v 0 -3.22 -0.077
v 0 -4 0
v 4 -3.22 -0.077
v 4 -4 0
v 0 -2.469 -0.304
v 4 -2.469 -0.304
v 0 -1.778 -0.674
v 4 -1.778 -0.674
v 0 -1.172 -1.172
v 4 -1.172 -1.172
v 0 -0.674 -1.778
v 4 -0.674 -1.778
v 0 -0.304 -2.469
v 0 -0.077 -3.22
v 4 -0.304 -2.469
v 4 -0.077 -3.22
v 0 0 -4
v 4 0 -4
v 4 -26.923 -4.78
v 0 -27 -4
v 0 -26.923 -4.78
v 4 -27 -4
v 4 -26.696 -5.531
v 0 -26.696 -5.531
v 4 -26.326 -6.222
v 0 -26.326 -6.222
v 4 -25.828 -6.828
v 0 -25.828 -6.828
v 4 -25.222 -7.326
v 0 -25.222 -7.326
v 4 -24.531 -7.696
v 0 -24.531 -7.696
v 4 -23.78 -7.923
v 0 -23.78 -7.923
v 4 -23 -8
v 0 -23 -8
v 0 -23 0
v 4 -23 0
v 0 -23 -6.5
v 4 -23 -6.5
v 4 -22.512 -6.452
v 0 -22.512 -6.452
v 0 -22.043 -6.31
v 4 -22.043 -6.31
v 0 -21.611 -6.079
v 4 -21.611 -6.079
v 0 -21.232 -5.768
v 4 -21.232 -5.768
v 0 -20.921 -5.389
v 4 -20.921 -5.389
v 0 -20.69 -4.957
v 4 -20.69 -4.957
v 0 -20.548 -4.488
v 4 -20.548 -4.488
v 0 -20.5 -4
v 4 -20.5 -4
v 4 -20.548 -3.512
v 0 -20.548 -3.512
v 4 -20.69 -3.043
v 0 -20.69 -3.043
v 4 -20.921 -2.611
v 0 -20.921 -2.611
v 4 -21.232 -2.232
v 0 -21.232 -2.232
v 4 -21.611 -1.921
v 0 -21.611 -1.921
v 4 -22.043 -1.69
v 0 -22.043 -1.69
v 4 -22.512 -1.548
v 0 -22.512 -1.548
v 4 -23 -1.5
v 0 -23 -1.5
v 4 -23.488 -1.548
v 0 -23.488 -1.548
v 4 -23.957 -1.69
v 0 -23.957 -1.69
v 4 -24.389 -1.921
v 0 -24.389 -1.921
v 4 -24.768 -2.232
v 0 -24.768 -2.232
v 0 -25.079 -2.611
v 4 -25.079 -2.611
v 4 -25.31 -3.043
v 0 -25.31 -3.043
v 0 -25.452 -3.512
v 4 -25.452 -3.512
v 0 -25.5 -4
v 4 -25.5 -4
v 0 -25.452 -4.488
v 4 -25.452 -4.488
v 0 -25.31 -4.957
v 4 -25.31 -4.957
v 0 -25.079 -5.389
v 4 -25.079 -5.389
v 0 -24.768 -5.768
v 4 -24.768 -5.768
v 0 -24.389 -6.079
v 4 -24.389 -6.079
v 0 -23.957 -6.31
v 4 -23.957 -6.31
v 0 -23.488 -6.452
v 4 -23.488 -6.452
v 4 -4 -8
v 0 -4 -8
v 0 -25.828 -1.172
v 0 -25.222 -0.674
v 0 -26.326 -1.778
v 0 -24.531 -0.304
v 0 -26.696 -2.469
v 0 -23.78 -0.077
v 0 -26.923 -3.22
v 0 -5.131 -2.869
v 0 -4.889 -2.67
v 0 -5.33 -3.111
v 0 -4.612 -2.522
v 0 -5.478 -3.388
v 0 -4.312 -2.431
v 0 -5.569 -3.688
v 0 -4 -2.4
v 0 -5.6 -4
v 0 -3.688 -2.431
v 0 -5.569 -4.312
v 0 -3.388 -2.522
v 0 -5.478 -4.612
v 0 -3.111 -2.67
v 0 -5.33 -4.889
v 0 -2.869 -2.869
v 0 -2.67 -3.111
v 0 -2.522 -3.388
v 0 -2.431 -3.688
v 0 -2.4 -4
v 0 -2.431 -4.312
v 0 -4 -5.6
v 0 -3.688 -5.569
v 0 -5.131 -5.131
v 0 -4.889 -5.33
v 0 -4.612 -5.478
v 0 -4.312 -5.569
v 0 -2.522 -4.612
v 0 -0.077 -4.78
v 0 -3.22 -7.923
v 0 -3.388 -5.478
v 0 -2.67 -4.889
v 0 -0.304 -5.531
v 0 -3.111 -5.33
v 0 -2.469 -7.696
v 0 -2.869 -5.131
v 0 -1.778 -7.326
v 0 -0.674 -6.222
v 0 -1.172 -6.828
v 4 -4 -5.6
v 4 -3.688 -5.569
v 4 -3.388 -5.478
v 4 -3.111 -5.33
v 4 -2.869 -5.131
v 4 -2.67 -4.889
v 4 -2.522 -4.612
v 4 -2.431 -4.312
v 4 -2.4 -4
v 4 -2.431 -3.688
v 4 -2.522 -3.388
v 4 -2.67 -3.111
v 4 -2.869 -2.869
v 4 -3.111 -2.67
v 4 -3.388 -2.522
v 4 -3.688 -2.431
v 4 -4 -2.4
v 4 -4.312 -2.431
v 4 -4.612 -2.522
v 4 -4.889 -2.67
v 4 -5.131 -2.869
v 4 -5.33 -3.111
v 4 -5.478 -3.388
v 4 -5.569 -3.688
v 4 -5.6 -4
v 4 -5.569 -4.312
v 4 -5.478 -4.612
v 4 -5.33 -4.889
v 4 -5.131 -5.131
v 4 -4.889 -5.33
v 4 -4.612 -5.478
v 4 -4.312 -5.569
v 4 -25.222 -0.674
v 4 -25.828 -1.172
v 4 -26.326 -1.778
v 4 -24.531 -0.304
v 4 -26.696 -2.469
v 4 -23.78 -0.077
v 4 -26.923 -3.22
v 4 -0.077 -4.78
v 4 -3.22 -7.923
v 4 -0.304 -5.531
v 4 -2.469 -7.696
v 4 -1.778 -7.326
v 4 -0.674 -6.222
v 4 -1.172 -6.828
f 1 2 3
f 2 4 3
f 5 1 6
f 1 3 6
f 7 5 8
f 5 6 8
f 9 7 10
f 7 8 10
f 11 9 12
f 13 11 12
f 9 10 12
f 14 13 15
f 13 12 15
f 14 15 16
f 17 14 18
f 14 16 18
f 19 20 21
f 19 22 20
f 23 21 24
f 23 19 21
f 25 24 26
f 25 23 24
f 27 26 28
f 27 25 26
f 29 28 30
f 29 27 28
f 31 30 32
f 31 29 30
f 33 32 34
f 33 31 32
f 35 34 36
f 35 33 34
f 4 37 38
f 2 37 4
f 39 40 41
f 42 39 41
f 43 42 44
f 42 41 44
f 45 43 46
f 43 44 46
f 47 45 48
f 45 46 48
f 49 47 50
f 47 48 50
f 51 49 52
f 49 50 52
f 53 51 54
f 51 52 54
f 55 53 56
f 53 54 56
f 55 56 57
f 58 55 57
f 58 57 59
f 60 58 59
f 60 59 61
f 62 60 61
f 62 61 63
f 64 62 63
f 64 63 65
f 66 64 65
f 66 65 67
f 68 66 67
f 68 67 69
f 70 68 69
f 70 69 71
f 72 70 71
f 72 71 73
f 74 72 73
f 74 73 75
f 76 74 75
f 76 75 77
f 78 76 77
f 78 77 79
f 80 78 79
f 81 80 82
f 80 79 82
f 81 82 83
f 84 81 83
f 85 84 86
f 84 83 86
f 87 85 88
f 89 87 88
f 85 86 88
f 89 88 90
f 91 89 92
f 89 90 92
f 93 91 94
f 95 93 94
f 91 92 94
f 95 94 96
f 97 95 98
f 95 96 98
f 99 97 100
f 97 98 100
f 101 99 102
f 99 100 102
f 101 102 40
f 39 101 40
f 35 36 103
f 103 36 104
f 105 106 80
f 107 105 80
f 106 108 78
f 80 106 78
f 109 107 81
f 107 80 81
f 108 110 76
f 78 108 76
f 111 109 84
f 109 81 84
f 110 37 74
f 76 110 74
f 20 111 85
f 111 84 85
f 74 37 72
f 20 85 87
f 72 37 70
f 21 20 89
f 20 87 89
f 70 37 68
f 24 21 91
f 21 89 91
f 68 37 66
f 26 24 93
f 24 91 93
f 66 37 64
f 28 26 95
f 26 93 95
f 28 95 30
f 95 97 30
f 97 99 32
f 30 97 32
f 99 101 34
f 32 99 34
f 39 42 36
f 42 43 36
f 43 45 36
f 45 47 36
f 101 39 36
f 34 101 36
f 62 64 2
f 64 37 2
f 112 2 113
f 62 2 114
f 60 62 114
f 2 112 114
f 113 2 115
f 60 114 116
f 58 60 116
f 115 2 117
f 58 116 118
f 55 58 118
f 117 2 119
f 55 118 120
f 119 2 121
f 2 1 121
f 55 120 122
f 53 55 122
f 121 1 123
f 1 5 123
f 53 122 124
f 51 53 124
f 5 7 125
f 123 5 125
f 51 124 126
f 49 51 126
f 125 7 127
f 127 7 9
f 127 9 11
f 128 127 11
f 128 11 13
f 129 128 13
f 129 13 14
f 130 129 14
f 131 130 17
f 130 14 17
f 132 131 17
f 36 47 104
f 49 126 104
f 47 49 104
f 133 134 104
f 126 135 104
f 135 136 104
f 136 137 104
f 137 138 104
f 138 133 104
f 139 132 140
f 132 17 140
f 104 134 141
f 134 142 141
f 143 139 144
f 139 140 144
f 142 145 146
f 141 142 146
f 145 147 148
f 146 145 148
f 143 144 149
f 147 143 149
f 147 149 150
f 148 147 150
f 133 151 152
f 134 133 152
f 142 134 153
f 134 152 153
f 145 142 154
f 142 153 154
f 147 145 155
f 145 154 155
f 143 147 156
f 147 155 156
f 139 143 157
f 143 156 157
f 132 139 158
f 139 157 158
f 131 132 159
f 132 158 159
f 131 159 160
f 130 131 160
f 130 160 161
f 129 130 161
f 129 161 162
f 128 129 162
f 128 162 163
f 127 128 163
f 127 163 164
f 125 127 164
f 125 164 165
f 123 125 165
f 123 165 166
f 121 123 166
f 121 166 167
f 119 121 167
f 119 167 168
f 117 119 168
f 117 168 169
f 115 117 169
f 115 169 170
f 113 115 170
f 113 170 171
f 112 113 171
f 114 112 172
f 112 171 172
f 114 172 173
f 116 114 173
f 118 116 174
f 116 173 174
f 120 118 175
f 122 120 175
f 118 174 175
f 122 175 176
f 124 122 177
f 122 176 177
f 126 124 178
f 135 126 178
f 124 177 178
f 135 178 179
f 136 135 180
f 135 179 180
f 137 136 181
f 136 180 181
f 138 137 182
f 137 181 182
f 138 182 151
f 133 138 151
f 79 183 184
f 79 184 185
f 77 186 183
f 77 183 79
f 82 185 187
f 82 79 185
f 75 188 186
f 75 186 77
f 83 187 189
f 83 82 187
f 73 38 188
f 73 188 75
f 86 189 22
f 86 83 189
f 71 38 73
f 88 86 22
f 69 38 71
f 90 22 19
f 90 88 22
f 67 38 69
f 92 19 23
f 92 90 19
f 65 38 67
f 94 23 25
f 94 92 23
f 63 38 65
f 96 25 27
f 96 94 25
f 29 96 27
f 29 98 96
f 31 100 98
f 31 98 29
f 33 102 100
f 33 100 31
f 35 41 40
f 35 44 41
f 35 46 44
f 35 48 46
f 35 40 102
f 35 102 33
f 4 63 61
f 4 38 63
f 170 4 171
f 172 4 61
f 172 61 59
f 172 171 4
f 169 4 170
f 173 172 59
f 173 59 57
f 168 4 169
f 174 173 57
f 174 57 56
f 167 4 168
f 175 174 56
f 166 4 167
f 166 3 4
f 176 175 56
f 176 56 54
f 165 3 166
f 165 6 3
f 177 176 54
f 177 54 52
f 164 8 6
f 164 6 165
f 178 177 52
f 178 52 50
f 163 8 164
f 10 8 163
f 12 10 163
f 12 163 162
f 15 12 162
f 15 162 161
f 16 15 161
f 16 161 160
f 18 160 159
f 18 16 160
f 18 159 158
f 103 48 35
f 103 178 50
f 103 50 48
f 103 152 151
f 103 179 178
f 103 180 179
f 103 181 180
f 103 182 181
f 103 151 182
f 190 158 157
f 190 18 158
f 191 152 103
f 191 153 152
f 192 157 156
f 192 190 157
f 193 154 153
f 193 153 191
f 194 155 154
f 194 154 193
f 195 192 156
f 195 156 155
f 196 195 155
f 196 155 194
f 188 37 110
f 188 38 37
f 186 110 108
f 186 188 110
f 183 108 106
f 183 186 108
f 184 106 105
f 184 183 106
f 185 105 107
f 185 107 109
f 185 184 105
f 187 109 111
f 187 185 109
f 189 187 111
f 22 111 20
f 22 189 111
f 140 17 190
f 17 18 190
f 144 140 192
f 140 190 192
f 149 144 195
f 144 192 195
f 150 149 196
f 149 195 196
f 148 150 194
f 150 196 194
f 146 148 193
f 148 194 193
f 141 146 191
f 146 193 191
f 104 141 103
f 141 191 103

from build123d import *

# Parameters (mm, degrees)
SKETCH1_W           = 8
SKETCH1_H           = 27
BOSS_EXTRUDE1_DEPTH = 4
SKETCH2_R           = 2.5
SKETCH2_R_2         = 1.6
CUT_EXTRUDE1_DEPTH  = 29.442925307
FILLET1_R           = 4


with BuildPart() as part:
    # Sketch1 → Boss-Extrude1 (new body)
    with BuildSketch(Plane(origin=(0, 0, 0), x_dir=(0, 0, -1), z_dir=(1, 0, 0))):
        with Locations((4, -13.5)):
            Rectangle(SKETCH1_W, SKETCH1_H)
    extrude(amount=BOSS_EXTRUDE1_DEPTH)

    # Sketch2 → Cut-Extrude1 (cut, through all)
    with BuildSketch(Plane(origin=(4, 0, 0), x_dir=(0, 0, -1), z_dir=(1, 0, 0))):
        with Locations((4, -23)):
            Circle(SKETCH2_R)
        with Locations((4, -4)):
            Circle(SKETCH2_R_2)
    extrude(amount=-CUT_EXTRUDE1_DEPTH, mode=Mode.SUBTRACT)

    # Fillet1
    fillet1_edges = [part.edges().sort_by_distance(p)[0] for p in [
        (2, -27, -8),
        (2, -27, 0),
        (2, 0, 0),
        (2, 0, -8),
    ]]
    fillet(fillet1_edges, radius=FILLET1_R - 0.0001)  # a hair under: the kernel refuses the full size


solid = part.part
